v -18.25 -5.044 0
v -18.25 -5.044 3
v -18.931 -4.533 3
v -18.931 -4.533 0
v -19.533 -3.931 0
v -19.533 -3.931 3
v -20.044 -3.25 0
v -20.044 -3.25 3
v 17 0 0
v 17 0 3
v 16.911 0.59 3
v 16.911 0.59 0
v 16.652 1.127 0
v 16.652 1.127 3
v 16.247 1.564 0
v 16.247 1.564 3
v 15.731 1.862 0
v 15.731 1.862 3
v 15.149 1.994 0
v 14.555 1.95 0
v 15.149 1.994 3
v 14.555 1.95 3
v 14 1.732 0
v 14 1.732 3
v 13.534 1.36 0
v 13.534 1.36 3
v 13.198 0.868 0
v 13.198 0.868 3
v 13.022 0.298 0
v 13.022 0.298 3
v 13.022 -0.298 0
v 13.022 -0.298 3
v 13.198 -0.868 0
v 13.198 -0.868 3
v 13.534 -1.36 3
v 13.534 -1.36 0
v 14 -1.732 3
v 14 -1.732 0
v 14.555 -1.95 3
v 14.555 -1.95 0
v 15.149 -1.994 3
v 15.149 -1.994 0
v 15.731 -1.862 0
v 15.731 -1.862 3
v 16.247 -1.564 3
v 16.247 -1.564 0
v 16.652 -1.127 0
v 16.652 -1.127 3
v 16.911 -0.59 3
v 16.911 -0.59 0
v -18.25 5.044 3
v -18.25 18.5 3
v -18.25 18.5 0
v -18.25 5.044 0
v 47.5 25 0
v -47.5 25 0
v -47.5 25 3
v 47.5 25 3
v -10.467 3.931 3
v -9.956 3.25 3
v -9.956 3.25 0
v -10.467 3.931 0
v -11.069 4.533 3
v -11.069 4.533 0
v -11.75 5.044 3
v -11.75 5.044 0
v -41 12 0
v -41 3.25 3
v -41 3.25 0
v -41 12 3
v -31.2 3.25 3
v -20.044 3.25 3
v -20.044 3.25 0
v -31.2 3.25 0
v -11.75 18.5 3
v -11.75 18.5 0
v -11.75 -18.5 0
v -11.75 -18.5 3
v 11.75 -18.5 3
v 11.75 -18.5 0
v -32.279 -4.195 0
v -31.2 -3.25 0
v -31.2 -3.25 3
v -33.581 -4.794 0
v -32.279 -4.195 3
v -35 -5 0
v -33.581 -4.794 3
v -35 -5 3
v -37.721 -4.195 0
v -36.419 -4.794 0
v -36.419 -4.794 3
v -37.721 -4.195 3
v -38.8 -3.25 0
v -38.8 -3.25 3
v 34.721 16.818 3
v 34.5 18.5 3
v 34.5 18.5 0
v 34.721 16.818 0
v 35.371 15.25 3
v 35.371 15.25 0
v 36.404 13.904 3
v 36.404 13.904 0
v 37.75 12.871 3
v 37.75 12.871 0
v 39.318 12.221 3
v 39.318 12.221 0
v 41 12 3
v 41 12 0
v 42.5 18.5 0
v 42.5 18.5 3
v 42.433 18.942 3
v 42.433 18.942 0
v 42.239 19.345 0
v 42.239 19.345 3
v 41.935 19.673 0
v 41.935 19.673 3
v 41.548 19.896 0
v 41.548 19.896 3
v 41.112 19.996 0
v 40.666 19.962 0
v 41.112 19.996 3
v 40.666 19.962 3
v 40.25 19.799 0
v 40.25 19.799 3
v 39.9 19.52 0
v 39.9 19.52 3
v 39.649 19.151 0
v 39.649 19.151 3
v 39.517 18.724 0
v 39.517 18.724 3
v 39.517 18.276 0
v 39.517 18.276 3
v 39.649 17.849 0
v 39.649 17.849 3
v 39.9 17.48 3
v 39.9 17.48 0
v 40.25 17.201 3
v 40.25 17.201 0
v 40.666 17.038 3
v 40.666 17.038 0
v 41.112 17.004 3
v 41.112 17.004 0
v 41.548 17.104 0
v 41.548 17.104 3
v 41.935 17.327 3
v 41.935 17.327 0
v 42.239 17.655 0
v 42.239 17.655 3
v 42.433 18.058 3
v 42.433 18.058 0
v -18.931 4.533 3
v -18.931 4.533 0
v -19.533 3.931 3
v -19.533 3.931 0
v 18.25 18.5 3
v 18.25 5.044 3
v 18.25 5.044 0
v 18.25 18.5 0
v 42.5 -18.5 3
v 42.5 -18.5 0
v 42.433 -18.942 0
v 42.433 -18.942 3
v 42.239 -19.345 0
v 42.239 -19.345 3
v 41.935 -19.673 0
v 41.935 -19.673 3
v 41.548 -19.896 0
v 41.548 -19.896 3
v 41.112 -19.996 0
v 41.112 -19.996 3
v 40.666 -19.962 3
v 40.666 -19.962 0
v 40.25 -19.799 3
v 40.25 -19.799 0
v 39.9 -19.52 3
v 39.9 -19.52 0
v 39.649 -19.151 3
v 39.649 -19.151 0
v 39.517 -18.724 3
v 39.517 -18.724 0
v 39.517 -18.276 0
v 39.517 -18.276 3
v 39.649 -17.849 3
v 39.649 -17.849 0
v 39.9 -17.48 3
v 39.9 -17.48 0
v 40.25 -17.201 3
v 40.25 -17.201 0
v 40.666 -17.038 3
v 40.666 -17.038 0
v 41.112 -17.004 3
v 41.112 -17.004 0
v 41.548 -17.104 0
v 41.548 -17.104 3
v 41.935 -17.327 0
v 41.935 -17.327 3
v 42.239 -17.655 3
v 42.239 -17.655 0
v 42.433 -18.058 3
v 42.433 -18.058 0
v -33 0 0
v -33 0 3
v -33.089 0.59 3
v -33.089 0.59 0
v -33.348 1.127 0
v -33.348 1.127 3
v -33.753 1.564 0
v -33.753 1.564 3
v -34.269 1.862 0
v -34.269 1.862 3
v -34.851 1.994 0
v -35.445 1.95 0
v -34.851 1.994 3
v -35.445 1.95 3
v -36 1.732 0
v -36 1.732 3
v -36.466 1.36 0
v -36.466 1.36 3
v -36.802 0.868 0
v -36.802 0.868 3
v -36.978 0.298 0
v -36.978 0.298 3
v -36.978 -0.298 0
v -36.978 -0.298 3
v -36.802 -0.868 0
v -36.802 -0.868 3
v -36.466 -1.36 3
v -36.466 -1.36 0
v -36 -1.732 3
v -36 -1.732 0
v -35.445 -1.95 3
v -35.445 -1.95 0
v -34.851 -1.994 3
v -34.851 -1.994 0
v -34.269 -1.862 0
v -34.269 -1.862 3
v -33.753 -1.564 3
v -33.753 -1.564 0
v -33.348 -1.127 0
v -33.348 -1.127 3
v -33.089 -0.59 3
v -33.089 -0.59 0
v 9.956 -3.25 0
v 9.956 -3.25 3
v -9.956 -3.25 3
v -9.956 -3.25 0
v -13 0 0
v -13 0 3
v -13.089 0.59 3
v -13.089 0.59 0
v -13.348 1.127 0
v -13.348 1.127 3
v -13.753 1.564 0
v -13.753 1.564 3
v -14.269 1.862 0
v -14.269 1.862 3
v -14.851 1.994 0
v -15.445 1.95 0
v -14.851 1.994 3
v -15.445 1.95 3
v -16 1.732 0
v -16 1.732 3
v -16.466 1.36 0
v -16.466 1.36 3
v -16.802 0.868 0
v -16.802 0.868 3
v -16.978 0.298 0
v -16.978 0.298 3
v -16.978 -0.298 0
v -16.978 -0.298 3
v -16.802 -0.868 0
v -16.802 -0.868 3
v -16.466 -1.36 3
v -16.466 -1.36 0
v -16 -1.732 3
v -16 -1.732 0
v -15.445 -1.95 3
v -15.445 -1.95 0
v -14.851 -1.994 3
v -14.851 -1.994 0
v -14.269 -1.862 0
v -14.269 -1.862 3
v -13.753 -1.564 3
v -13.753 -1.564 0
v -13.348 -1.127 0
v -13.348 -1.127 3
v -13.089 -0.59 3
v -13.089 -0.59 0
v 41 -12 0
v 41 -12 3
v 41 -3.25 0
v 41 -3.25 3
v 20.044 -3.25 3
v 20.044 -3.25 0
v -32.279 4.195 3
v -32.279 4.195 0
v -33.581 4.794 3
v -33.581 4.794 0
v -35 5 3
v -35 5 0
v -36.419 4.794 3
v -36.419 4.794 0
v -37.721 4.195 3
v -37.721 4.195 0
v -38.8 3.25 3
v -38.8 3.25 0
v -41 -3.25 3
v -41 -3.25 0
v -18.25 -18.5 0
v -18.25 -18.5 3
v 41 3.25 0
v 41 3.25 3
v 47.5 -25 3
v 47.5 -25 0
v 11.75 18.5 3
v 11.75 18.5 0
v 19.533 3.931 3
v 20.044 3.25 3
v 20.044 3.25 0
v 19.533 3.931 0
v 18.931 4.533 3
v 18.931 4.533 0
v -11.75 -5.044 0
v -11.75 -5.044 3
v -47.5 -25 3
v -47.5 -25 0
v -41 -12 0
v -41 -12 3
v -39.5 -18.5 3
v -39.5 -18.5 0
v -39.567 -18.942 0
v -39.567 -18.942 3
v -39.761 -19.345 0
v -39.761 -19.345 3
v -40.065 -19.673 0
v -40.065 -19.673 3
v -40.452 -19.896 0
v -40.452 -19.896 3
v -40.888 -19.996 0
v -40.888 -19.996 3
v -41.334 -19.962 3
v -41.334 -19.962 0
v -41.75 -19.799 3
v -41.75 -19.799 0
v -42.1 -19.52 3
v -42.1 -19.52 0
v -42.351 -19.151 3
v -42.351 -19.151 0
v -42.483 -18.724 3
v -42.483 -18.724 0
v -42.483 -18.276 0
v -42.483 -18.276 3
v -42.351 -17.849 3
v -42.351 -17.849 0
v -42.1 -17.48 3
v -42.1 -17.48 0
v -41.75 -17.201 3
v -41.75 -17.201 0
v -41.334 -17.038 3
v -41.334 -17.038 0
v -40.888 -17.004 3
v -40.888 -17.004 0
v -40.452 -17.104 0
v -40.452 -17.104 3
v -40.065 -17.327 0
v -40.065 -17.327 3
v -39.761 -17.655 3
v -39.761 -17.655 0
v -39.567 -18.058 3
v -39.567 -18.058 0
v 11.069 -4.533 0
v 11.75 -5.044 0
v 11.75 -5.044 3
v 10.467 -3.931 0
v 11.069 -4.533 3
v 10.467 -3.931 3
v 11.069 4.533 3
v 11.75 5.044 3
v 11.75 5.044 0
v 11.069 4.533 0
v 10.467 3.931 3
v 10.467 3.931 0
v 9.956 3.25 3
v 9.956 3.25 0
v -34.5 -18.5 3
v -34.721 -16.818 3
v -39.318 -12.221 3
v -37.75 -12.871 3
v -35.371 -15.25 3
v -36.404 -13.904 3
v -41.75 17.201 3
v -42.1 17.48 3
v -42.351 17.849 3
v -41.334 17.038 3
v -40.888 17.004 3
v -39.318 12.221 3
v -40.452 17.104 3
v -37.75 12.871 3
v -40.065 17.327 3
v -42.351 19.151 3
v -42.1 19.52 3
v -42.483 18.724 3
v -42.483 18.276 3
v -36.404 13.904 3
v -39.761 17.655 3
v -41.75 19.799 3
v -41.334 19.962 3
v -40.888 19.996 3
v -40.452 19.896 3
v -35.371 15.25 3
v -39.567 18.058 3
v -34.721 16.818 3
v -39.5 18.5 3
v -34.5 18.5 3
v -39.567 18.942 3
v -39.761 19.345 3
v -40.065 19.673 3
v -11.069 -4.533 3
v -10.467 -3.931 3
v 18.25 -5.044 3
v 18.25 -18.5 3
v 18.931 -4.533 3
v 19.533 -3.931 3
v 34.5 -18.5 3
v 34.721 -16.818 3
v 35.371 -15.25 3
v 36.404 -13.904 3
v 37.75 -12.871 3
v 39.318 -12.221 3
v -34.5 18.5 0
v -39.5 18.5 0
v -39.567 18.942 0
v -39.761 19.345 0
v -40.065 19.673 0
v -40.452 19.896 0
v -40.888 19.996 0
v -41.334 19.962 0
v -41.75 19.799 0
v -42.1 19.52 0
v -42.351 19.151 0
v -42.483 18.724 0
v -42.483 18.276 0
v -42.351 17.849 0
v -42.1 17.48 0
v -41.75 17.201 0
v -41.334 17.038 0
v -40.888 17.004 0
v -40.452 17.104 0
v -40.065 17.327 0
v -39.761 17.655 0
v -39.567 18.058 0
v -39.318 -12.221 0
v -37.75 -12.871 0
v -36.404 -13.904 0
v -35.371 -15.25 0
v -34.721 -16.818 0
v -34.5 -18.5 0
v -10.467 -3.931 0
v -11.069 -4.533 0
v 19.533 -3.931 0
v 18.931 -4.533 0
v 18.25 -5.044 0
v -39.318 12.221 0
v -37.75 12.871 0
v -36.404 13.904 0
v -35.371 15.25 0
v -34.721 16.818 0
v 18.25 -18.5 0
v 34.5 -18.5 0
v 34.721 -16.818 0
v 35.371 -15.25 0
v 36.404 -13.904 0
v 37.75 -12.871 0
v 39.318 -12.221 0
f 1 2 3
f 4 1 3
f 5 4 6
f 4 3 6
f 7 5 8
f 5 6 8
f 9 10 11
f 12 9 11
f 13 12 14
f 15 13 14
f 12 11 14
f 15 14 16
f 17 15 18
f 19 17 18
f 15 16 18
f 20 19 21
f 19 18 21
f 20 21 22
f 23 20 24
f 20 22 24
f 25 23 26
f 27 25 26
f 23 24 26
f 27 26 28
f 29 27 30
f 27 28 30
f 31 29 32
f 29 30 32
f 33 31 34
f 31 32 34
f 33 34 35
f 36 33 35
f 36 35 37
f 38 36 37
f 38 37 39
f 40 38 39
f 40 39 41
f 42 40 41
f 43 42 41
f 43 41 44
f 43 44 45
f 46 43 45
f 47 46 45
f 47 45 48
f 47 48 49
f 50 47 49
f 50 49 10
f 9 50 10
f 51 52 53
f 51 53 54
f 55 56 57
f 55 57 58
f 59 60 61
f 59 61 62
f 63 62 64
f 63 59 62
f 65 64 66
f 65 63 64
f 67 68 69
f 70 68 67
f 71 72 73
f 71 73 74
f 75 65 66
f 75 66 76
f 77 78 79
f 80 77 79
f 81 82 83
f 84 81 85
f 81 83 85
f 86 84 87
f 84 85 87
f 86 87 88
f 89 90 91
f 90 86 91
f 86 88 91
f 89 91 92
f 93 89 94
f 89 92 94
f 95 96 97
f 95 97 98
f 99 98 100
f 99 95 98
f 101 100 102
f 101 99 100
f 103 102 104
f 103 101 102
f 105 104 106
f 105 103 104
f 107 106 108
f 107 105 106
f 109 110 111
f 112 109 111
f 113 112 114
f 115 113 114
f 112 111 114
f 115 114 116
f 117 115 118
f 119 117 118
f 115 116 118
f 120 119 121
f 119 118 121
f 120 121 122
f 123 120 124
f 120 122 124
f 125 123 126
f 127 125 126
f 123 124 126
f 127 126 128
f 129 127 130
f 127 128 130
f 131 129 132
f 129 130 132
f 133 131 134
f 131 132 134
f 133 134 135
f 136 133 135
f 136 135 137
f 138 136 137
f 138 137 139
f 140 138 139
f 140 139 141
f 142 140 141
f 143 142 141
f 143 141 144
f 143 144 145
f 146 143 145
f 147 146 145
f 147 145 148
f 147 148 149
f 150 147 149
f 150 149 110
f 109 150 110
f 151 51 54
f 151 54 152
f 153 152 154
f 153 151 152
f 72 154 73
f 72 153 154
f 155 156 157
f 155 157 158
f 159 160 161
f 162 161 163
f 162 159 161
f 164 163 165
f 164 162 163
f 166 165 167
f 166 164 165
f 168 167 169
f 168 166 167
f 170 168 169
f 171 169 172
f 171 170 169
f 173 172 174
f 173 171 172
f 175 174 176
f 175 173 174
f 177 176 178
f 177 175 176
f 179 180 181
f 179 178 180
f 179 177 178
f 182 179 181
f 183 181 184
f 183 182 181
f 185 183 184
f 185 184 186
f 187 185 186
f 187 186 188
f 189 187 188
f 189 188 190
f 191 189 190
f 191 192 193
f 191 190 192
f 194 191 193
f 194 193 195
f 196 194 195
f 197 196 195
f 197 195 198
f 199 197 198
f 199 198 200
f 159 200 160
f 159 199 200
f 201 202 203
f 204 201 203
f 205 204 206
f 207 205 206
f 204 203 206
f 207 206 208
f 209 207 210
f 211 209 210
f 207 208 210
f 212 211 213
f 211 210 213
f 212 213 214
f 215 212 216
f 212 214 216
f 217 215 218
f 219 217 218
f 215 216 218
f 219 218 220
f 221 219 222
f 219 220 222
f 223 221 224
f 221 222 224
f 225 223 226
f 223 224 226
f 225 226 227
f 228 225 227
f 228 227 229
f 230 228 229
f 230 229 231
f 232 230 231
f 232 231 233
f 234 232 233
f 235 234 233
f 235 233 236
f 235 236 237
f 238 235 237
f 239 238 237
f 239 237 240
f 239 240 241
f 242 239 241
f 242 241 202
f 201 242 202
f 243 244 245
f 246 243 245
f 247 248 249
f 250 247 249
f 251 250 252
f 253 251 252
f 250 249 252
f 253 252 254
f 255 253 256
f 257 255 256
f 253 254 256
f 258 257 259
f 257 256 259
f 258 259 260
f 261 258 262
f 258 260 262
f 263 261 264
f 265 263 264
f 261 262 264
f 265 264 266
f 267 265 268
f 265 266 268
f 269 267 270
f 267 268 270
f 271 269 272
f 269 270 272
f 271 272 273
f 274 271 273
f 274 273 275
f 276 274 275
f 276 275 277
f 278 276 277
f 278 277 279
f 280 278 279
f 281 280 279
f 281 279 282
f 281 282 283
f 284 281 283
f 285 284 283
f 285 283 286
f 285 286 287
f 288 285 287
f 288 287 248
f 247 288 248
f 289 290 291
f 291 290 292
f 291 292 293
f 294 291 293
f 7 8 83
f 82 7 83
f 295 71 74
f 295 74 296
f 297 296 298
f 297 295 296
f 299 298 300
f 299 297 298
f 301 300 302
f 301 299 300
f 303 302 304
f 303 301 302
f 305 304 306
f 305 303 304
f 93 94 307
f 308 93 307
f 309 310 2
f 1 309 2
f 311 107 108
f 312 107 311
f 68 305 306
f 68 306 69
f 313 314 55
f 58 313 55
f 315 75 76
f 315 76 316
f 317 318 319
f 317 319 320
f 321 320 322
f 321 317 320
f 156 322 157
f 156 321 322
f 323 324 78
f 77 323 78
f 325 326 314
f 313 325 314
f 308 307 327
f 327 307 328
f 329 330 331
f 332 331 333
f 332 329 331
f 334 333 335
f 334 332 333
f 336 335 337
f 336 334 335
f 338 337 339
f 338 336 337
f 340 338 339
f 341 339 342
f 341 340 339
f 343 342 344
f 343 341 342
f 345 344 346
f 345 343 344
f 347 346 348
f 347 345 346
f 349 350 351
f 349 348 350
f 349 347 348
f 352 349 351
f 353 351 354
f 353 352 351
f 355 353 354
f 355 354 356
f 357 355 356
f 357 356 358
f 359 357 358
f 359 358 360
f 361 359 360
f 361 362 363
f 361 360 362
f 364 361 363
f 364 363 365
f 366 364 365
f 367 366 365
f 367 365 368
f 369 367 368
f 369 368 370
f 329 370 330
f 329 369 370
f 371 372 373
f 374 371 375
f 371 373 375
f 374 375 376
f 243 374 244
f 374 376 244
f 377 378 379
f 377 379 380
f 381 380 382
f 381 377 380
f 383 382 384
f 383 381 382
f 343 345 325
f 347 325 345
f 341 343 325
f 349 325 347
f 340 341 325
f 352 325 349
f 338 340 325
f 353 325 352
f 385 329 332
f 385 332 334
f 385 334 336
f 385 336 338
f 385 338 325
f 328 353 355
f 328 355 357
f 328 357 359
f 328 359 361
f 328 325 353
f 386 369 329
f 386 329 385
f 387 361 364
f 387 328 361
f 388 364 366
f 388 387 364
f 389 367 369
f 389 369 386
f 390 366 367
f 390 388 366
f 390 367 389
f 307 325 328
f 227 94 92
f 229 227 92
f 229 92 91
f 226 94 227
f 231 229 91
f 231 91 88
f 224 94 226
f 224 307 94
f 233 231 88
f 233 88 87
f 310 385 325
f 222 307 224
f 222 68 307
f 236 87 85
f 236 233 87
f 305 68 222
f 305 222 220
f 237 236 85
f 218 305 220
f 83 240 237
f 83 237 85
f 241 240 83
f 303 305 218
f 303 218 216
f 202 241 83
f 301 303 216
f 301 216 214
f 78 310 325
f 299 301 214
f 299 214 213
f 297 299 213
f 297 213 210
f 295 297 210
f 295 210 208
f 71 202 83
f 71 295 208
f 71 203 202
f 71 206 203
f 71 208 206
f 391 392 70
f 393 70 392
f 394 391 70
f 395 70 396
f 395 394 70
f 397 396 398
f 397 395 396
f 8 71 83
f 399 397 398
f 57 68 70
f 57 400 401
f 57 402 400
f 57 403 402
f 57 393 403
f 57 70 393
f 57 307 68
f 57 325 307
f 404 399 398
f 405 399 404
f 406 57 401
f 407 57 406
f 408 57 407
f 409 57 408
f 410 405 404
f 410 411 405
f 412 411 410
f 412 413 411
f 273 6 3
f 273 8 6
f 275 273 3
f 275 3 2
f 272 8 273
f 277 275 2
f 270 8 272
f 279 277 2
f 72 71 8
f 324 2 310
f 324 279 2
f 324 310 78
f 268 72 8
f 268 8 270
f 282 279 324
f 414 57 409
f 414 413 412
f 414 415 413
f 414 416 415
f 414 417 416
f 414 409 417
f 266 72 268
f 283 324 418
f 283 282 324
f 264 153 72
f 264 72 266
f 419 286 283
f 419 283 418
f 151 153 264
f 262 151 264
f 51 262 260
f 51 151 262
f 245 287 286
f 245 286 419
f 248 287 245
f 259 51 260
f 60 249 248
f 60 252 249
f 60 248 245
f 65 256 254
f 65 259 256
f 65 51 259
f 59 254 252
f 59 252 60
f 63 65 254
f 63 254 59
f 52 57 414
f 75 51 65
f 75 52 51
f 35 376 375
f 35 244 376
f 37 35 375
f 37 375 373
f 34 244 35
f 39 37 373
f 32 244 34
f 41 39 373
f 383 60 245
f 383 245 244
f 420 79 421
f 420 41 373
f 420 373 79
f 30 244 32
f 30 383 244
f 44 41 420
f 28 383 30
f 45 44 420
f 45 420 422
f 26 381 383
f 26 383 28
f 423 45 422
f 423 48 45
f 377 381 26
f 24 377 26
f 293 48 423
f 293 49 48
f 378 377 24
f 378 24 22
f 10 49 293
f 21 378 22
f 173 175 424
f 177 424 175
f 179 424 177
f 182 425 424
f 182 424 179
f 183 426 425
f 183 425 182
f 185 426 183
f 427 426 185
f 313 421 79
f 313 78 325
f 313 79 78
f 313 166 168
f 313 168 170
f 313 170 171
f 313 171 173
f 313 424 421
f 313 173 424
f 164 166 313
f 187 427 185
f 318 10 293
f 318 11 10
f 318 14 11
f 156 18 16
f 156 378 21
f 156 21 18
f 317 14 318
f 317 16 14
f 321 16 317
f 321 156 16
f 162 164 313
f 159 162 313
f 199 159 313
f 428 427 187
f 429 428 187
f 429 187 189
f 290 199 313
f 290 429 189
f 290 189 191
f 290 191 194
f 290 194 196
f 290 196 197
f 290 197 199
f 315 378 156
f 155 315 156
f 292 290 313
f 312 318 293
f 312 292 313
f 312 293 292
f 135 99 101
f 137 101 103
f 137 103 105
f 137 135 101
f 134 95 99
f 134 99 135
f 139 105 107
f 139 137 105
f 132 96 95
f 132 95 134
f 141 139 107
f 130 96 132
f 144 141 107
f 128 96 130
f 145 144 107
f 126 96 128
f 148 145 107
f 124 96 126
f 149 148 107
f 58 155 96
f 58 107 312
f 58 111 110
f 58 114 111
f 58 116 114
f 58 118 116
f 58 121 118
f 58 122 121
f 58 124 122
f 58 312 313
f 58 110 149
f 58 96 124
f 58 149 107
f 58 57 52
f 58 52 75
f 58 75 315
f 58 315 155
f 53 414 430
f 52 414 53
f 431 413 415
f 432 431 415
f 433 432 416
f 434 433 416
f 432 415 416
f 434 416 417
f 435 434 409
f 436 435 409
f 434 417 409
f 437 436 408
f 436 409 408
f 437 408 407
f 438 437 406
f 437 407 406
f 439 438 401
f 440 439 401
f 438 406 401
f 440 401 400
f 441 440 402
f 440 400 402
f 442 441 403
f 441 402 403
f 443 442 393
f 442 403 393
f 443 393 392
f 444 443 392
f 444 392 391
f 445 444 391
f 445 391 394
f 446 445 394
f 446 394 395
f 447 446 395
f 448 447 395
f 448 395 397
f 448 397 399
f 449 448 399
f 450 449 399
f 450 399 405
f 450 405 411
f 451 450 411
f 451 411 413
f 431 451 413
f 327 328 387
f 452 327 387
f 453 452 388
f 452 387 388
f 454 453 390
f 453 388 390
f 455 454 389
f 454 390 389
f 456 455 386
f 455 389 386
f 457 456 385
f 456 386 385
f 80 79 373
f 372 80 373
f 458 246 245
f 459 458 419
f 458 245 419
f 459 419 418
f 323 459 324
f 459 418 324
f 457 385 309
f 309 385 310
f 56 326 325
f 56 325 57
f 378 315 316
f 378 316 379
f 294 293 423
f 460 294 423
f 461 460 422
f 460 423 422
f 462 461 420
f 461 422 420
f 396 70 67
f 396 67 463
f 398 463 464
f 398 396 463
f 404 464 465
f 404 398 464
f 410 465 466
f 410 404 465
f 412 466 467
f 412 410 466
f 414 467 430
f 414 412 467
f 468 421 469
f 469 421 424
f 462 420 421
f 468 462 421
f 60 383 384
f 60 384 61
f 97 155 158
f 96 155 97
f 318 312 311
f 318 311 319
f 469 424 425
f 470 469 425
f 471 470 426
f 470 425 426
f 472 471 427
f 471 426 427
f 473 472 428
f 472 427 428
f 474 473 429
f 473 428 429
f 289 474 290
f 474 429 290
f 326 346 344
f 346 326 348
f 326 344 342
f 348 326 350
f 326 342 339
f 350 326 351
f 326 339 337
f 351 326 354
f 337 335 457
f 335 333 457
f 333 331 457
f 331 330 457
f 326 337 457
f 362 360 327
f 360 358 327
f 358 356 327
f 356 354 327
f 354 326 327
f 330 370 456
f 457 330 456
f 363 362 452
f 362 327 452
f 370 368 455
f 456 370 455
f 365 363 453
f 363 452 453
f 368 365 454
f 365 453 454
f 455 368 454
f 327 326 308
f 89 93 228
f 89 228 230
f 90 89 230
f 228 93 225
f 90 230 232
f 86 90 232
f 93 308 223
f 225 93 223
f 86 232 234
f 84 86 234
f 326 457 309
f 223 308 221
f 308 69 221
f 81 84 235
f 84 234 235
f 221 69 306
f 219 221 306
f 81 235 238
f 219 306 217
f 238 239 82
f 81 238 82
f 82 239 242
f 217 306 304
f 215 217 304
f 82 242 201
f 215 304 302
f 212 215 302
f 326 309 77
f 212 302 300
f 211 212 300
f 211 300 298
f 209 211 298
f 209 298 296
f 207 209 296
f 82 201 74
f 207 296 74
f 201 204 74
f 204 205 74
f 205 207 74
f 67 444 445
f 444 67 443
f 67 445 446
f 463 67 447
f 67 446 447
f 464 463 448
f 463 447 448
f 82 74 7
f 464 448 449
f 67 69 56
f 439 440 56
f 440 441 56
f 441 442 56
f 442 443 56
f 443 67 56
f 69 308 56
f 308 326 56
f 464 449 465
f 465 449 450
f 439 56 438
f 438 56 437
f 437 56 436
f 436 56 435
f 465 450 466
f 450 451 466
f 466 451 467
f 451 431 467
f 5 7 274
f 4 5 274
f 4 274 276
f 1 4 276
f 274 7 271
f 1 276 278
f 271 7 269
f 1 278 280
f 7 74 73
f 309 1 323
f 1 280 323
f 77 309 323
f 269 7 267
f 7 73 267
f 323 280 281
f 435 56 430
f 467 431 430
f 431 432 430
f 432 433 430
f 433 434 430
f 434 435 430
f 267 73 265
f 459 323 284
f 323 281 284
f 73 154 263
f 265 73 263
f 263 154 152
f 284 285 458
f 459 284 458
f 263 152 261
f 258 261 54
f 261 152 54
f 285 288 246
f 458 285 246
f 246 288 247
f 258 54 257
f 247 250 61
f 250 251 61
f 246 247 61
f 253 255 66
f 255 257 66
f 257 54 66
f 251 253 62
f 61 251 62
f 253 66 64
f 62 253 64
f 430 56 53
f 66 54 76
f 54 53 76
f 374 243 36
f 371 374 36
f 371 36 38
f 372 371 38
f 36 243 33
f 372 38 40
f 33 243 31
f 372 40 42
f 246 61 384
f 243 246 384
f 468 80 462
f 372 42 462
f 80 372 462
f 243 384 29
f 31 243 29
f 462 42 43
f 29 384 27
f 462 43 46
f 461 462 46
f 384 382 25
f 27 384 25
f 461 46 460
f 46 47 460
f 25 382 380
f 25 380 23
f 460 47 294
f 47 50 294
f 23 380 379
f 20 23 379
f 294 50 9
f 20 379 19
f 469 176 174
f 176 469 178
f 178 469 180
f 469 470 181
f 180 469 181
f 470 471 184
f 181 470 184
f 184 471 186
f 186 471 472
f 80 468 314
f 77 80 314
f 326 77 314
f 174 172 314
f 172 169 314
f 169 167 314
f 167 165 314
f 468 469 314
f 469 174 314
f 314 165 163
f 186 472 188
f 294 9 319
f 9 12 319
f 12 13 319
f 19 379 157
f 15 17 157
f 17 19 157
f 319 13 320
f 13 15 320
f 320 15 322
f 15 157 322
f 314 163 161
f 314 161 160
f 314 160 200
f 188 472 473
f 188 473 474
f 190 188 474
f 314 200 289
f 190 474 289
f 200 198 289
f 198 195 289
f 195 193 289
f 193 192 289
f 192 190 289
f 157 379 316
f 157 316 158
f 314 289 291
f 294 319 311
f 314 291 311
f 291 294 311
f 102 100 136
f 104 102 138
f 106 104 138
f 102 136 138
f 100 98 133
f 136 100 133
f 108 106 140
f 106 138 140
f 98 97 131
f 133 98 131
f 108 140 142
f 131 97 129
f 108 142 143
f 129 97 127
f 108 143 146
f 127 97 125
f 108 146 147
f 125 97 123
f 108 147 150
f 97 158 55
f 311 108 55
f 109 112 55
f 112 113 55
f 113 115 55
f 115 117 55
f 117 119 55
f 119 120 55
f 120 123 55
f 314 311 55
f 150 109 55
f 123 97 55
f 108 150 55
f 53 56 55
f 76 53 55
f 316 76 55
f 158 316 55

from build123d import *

# Parameters (mm, degrees)
SKETCH1_W           = 95
SKETCH1_H           = 50
BOSS_EXTRUDE1_DEPTH = 3
SKETCH4_R           = 2
CUT_EXTRUDE3_DEPTH  = 4
SKETCH5_R           = 1.5
CUT_EXTRUDE4_DEPTH  = 4


with BuildPart() as part:
    # Sketch1 → Boss-Extrude1 (new body)
    with BuildSketch(Plane.XY):
        Rectangle(SKETCH1_W, SKETCH1_H)
    extrude(amount=BOSS_EXTRUDE1_DEPTH)

    # Sketch4 → Cut-Extrude3 (cut, through all)
    with BuildSketch(Plane.XY.offset(3)):
        with Locations((-15, 0)):
            Circle(SKETCH4_R)
        with Locations((15, 0)):
            Circle(SKETCH4_R)
        with Locations((-35, 0)):
            Circle(SKETCH4_R)
    extrude(amount=-CUT_EXTRUDE3_DEPTH, mode=Mode.SUBTRACT)

    # Sketch5 → Cut-Extrude4 (cut, through all)
    with BuildSketch(Plane.XY.offset(3)):
        with Locations((41, 18.5)):
            Circle(SKETCH5_R)
        with Locations((-41, 18.5)):
            Circle(SKETCH5_R)
        with BuildLine():
            Line((-34.5, 18.5), (-18.25, 18.5))
            Line((-18.25, 18.5), (-18.25, 5.04356025))
            ThreePointArc((-18.25, 5.04356025), (-19.242640687, 4.242640687), (-20.04356025, 3.25))
            Line((-20.04356025, 3.25), (-31.200328962, 3.25))
            ThreePointArc((-31.200328962, 3.25), (-35, 5), (-38.799671038, 3.25))
            Line((-38.799671038, 3.25), (-41, 3.25))
            Line((-41, 3.25), (-41, 12))
            ThreePointArc((-41, 12), (-36.403805922, 13.903805922), (-34.5, 18.5))
        make_face()
        with BuildLine():
            Line((-11.75, 5.04356025), (-11.75, 18.5))
            Line((-11.75, 18.5), (11.75, 18.5))
            Line((11.75, 18.5), (11.75, 5.04356025))
            ThreePointArc((11.75, 5.04356025), (10.757359313, 4.242640687), (9.95643975, 3.25))
            Line((9.95643975, 3.25), (-9.95643975, 3.25))
            ThreePointArc((-9.95643975, 3.25), (-10.757359313, 4.242640687), (-11.75, 5.04356025))
        make_face()
        with BuildLine():
            Line((18.25, 5.04356025), (18.25, 18.5))
            Line((18.25, 18.5), (34.5, 18.5))
            ThreePointArc((34.5, 18.5), (36.403805922, 13.903805922), (41, 12))
            Line((41, 12), (41, 3.25))
            Line((41, 3.25), (20.04356025, 3.25))
            ThreePointArc((20.04356025, 3.25), (19.242640687, 4.242640687), (18.25, 5.04356025))
        make_face()
    cut_extrude4 = extrude(amount=-CUT_EXTRUDE4_DEPTH, mode=Mode.SUBTRACT)

    # Mirror2: Cut-Extrude4 across plane
    add(cut_extrude4.mirror(Plane.ZX), mode=Mode.SUBTRACT)


solid = part.part
